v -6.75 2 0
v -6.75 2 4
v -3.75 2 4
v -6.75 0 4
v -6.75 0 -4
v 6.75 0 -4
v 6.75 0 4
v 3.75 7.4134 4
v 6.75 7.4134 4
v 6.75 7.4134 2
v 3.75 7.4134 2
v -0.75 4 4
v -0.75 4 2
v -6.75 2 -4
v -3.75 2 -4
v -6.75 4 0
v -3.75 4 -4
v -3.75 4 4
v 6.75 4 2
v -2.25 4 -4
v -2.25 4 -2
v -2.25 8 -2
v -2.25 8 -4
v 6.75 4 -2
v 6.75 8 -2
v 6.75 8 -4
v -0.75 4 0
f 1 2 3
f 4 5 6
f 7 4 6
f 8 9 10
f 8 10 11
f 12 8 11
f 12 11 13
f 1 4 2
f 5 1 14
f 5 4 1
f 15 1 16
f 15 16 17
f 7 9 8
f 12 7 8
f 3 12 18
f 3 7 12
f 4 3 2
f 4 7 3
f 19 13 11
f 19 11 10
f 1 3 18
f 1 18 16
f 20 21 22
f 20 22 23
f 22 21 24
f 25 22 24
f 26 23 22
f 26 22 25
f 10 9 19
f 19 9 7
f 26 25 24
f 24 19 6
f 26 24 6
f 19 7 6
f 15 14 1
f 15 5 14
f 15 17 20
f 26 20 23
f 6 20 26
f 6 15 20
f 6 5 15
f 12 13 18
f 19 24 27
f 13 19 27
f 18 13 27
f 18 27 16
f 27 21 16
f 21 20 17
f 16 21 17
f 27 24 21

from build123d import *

# Parameters (mm, degrees)
SKETCH1_W           = 13.5
SKETCH1_H           = 8
BOSS_EXTRUDE1_DEPTH = 2
BOSS_EXTRUDE2_DEPTH = 2
SKETCH3_W           = 9
SKETCH3_H           = 2
SKETCH3_W_2         = 7.5
BOSS_EXTRUDE3_DEPTH = 4
CUT_EXTRUDE1_DEPTH  = 4


with BuildPart() as part:
    # Sketch1 → Boss-Extrude1 (new body)
    with BuildSketch(Plane(origin=(0, 0, 0), x_dir=(1, 0, 0), z_dir=(0, 1, 0))):
        Rectangle(SKETCH1_W, SKETCH1_H)
    extrude(amount=BOSS_EXTRUDE1_DEPTH)

    # Sketch2 → Boss-Extrude2 (add)
    with BuildSketch(Plane(origin=(0, 2, 0), x_dir=(1, 0, 0), z_dir=(0, 1, 0))):
        Polygon((-6.75, 0), (-3.75, 4), (6.75, 4), (6.75, -4), (-3.75, -4), align=None)
    extrude(amount=BOSS_EXTRUDE2_DEPTH)

    # Sketch3 → Boss-Extrude3 (add)
    with BuildSketch(Plane(origin=(0, 4, 0), x_dir=(1, 0, 0), z_dir=(0, 1, 0))):
        with Locations((2.25, 3)):
            Rectangle(SKETCH3_W, SKETCH3_H)
        with Locations((3, -3)):
            Rectangle(SKETCH3_W_2, SKETCH3_H)
    extrude(amount=BOSS_EXTRUDE3_DEPTH)

    # Sketch4 → Cut-Extrude1 (cut)
    with BuildSketch(Plane.XY.offset(4)):
        Polygon((6.75, 7.413398543), (3.75, 7.413398543), (-0.75, 4), (-0.75, 8), (6.75, 8), align=None)
    extrude(amount=-CUT_EXTRUDE1_DEPTH, mode=Mode.SUBTRACT)


solid = part.part
